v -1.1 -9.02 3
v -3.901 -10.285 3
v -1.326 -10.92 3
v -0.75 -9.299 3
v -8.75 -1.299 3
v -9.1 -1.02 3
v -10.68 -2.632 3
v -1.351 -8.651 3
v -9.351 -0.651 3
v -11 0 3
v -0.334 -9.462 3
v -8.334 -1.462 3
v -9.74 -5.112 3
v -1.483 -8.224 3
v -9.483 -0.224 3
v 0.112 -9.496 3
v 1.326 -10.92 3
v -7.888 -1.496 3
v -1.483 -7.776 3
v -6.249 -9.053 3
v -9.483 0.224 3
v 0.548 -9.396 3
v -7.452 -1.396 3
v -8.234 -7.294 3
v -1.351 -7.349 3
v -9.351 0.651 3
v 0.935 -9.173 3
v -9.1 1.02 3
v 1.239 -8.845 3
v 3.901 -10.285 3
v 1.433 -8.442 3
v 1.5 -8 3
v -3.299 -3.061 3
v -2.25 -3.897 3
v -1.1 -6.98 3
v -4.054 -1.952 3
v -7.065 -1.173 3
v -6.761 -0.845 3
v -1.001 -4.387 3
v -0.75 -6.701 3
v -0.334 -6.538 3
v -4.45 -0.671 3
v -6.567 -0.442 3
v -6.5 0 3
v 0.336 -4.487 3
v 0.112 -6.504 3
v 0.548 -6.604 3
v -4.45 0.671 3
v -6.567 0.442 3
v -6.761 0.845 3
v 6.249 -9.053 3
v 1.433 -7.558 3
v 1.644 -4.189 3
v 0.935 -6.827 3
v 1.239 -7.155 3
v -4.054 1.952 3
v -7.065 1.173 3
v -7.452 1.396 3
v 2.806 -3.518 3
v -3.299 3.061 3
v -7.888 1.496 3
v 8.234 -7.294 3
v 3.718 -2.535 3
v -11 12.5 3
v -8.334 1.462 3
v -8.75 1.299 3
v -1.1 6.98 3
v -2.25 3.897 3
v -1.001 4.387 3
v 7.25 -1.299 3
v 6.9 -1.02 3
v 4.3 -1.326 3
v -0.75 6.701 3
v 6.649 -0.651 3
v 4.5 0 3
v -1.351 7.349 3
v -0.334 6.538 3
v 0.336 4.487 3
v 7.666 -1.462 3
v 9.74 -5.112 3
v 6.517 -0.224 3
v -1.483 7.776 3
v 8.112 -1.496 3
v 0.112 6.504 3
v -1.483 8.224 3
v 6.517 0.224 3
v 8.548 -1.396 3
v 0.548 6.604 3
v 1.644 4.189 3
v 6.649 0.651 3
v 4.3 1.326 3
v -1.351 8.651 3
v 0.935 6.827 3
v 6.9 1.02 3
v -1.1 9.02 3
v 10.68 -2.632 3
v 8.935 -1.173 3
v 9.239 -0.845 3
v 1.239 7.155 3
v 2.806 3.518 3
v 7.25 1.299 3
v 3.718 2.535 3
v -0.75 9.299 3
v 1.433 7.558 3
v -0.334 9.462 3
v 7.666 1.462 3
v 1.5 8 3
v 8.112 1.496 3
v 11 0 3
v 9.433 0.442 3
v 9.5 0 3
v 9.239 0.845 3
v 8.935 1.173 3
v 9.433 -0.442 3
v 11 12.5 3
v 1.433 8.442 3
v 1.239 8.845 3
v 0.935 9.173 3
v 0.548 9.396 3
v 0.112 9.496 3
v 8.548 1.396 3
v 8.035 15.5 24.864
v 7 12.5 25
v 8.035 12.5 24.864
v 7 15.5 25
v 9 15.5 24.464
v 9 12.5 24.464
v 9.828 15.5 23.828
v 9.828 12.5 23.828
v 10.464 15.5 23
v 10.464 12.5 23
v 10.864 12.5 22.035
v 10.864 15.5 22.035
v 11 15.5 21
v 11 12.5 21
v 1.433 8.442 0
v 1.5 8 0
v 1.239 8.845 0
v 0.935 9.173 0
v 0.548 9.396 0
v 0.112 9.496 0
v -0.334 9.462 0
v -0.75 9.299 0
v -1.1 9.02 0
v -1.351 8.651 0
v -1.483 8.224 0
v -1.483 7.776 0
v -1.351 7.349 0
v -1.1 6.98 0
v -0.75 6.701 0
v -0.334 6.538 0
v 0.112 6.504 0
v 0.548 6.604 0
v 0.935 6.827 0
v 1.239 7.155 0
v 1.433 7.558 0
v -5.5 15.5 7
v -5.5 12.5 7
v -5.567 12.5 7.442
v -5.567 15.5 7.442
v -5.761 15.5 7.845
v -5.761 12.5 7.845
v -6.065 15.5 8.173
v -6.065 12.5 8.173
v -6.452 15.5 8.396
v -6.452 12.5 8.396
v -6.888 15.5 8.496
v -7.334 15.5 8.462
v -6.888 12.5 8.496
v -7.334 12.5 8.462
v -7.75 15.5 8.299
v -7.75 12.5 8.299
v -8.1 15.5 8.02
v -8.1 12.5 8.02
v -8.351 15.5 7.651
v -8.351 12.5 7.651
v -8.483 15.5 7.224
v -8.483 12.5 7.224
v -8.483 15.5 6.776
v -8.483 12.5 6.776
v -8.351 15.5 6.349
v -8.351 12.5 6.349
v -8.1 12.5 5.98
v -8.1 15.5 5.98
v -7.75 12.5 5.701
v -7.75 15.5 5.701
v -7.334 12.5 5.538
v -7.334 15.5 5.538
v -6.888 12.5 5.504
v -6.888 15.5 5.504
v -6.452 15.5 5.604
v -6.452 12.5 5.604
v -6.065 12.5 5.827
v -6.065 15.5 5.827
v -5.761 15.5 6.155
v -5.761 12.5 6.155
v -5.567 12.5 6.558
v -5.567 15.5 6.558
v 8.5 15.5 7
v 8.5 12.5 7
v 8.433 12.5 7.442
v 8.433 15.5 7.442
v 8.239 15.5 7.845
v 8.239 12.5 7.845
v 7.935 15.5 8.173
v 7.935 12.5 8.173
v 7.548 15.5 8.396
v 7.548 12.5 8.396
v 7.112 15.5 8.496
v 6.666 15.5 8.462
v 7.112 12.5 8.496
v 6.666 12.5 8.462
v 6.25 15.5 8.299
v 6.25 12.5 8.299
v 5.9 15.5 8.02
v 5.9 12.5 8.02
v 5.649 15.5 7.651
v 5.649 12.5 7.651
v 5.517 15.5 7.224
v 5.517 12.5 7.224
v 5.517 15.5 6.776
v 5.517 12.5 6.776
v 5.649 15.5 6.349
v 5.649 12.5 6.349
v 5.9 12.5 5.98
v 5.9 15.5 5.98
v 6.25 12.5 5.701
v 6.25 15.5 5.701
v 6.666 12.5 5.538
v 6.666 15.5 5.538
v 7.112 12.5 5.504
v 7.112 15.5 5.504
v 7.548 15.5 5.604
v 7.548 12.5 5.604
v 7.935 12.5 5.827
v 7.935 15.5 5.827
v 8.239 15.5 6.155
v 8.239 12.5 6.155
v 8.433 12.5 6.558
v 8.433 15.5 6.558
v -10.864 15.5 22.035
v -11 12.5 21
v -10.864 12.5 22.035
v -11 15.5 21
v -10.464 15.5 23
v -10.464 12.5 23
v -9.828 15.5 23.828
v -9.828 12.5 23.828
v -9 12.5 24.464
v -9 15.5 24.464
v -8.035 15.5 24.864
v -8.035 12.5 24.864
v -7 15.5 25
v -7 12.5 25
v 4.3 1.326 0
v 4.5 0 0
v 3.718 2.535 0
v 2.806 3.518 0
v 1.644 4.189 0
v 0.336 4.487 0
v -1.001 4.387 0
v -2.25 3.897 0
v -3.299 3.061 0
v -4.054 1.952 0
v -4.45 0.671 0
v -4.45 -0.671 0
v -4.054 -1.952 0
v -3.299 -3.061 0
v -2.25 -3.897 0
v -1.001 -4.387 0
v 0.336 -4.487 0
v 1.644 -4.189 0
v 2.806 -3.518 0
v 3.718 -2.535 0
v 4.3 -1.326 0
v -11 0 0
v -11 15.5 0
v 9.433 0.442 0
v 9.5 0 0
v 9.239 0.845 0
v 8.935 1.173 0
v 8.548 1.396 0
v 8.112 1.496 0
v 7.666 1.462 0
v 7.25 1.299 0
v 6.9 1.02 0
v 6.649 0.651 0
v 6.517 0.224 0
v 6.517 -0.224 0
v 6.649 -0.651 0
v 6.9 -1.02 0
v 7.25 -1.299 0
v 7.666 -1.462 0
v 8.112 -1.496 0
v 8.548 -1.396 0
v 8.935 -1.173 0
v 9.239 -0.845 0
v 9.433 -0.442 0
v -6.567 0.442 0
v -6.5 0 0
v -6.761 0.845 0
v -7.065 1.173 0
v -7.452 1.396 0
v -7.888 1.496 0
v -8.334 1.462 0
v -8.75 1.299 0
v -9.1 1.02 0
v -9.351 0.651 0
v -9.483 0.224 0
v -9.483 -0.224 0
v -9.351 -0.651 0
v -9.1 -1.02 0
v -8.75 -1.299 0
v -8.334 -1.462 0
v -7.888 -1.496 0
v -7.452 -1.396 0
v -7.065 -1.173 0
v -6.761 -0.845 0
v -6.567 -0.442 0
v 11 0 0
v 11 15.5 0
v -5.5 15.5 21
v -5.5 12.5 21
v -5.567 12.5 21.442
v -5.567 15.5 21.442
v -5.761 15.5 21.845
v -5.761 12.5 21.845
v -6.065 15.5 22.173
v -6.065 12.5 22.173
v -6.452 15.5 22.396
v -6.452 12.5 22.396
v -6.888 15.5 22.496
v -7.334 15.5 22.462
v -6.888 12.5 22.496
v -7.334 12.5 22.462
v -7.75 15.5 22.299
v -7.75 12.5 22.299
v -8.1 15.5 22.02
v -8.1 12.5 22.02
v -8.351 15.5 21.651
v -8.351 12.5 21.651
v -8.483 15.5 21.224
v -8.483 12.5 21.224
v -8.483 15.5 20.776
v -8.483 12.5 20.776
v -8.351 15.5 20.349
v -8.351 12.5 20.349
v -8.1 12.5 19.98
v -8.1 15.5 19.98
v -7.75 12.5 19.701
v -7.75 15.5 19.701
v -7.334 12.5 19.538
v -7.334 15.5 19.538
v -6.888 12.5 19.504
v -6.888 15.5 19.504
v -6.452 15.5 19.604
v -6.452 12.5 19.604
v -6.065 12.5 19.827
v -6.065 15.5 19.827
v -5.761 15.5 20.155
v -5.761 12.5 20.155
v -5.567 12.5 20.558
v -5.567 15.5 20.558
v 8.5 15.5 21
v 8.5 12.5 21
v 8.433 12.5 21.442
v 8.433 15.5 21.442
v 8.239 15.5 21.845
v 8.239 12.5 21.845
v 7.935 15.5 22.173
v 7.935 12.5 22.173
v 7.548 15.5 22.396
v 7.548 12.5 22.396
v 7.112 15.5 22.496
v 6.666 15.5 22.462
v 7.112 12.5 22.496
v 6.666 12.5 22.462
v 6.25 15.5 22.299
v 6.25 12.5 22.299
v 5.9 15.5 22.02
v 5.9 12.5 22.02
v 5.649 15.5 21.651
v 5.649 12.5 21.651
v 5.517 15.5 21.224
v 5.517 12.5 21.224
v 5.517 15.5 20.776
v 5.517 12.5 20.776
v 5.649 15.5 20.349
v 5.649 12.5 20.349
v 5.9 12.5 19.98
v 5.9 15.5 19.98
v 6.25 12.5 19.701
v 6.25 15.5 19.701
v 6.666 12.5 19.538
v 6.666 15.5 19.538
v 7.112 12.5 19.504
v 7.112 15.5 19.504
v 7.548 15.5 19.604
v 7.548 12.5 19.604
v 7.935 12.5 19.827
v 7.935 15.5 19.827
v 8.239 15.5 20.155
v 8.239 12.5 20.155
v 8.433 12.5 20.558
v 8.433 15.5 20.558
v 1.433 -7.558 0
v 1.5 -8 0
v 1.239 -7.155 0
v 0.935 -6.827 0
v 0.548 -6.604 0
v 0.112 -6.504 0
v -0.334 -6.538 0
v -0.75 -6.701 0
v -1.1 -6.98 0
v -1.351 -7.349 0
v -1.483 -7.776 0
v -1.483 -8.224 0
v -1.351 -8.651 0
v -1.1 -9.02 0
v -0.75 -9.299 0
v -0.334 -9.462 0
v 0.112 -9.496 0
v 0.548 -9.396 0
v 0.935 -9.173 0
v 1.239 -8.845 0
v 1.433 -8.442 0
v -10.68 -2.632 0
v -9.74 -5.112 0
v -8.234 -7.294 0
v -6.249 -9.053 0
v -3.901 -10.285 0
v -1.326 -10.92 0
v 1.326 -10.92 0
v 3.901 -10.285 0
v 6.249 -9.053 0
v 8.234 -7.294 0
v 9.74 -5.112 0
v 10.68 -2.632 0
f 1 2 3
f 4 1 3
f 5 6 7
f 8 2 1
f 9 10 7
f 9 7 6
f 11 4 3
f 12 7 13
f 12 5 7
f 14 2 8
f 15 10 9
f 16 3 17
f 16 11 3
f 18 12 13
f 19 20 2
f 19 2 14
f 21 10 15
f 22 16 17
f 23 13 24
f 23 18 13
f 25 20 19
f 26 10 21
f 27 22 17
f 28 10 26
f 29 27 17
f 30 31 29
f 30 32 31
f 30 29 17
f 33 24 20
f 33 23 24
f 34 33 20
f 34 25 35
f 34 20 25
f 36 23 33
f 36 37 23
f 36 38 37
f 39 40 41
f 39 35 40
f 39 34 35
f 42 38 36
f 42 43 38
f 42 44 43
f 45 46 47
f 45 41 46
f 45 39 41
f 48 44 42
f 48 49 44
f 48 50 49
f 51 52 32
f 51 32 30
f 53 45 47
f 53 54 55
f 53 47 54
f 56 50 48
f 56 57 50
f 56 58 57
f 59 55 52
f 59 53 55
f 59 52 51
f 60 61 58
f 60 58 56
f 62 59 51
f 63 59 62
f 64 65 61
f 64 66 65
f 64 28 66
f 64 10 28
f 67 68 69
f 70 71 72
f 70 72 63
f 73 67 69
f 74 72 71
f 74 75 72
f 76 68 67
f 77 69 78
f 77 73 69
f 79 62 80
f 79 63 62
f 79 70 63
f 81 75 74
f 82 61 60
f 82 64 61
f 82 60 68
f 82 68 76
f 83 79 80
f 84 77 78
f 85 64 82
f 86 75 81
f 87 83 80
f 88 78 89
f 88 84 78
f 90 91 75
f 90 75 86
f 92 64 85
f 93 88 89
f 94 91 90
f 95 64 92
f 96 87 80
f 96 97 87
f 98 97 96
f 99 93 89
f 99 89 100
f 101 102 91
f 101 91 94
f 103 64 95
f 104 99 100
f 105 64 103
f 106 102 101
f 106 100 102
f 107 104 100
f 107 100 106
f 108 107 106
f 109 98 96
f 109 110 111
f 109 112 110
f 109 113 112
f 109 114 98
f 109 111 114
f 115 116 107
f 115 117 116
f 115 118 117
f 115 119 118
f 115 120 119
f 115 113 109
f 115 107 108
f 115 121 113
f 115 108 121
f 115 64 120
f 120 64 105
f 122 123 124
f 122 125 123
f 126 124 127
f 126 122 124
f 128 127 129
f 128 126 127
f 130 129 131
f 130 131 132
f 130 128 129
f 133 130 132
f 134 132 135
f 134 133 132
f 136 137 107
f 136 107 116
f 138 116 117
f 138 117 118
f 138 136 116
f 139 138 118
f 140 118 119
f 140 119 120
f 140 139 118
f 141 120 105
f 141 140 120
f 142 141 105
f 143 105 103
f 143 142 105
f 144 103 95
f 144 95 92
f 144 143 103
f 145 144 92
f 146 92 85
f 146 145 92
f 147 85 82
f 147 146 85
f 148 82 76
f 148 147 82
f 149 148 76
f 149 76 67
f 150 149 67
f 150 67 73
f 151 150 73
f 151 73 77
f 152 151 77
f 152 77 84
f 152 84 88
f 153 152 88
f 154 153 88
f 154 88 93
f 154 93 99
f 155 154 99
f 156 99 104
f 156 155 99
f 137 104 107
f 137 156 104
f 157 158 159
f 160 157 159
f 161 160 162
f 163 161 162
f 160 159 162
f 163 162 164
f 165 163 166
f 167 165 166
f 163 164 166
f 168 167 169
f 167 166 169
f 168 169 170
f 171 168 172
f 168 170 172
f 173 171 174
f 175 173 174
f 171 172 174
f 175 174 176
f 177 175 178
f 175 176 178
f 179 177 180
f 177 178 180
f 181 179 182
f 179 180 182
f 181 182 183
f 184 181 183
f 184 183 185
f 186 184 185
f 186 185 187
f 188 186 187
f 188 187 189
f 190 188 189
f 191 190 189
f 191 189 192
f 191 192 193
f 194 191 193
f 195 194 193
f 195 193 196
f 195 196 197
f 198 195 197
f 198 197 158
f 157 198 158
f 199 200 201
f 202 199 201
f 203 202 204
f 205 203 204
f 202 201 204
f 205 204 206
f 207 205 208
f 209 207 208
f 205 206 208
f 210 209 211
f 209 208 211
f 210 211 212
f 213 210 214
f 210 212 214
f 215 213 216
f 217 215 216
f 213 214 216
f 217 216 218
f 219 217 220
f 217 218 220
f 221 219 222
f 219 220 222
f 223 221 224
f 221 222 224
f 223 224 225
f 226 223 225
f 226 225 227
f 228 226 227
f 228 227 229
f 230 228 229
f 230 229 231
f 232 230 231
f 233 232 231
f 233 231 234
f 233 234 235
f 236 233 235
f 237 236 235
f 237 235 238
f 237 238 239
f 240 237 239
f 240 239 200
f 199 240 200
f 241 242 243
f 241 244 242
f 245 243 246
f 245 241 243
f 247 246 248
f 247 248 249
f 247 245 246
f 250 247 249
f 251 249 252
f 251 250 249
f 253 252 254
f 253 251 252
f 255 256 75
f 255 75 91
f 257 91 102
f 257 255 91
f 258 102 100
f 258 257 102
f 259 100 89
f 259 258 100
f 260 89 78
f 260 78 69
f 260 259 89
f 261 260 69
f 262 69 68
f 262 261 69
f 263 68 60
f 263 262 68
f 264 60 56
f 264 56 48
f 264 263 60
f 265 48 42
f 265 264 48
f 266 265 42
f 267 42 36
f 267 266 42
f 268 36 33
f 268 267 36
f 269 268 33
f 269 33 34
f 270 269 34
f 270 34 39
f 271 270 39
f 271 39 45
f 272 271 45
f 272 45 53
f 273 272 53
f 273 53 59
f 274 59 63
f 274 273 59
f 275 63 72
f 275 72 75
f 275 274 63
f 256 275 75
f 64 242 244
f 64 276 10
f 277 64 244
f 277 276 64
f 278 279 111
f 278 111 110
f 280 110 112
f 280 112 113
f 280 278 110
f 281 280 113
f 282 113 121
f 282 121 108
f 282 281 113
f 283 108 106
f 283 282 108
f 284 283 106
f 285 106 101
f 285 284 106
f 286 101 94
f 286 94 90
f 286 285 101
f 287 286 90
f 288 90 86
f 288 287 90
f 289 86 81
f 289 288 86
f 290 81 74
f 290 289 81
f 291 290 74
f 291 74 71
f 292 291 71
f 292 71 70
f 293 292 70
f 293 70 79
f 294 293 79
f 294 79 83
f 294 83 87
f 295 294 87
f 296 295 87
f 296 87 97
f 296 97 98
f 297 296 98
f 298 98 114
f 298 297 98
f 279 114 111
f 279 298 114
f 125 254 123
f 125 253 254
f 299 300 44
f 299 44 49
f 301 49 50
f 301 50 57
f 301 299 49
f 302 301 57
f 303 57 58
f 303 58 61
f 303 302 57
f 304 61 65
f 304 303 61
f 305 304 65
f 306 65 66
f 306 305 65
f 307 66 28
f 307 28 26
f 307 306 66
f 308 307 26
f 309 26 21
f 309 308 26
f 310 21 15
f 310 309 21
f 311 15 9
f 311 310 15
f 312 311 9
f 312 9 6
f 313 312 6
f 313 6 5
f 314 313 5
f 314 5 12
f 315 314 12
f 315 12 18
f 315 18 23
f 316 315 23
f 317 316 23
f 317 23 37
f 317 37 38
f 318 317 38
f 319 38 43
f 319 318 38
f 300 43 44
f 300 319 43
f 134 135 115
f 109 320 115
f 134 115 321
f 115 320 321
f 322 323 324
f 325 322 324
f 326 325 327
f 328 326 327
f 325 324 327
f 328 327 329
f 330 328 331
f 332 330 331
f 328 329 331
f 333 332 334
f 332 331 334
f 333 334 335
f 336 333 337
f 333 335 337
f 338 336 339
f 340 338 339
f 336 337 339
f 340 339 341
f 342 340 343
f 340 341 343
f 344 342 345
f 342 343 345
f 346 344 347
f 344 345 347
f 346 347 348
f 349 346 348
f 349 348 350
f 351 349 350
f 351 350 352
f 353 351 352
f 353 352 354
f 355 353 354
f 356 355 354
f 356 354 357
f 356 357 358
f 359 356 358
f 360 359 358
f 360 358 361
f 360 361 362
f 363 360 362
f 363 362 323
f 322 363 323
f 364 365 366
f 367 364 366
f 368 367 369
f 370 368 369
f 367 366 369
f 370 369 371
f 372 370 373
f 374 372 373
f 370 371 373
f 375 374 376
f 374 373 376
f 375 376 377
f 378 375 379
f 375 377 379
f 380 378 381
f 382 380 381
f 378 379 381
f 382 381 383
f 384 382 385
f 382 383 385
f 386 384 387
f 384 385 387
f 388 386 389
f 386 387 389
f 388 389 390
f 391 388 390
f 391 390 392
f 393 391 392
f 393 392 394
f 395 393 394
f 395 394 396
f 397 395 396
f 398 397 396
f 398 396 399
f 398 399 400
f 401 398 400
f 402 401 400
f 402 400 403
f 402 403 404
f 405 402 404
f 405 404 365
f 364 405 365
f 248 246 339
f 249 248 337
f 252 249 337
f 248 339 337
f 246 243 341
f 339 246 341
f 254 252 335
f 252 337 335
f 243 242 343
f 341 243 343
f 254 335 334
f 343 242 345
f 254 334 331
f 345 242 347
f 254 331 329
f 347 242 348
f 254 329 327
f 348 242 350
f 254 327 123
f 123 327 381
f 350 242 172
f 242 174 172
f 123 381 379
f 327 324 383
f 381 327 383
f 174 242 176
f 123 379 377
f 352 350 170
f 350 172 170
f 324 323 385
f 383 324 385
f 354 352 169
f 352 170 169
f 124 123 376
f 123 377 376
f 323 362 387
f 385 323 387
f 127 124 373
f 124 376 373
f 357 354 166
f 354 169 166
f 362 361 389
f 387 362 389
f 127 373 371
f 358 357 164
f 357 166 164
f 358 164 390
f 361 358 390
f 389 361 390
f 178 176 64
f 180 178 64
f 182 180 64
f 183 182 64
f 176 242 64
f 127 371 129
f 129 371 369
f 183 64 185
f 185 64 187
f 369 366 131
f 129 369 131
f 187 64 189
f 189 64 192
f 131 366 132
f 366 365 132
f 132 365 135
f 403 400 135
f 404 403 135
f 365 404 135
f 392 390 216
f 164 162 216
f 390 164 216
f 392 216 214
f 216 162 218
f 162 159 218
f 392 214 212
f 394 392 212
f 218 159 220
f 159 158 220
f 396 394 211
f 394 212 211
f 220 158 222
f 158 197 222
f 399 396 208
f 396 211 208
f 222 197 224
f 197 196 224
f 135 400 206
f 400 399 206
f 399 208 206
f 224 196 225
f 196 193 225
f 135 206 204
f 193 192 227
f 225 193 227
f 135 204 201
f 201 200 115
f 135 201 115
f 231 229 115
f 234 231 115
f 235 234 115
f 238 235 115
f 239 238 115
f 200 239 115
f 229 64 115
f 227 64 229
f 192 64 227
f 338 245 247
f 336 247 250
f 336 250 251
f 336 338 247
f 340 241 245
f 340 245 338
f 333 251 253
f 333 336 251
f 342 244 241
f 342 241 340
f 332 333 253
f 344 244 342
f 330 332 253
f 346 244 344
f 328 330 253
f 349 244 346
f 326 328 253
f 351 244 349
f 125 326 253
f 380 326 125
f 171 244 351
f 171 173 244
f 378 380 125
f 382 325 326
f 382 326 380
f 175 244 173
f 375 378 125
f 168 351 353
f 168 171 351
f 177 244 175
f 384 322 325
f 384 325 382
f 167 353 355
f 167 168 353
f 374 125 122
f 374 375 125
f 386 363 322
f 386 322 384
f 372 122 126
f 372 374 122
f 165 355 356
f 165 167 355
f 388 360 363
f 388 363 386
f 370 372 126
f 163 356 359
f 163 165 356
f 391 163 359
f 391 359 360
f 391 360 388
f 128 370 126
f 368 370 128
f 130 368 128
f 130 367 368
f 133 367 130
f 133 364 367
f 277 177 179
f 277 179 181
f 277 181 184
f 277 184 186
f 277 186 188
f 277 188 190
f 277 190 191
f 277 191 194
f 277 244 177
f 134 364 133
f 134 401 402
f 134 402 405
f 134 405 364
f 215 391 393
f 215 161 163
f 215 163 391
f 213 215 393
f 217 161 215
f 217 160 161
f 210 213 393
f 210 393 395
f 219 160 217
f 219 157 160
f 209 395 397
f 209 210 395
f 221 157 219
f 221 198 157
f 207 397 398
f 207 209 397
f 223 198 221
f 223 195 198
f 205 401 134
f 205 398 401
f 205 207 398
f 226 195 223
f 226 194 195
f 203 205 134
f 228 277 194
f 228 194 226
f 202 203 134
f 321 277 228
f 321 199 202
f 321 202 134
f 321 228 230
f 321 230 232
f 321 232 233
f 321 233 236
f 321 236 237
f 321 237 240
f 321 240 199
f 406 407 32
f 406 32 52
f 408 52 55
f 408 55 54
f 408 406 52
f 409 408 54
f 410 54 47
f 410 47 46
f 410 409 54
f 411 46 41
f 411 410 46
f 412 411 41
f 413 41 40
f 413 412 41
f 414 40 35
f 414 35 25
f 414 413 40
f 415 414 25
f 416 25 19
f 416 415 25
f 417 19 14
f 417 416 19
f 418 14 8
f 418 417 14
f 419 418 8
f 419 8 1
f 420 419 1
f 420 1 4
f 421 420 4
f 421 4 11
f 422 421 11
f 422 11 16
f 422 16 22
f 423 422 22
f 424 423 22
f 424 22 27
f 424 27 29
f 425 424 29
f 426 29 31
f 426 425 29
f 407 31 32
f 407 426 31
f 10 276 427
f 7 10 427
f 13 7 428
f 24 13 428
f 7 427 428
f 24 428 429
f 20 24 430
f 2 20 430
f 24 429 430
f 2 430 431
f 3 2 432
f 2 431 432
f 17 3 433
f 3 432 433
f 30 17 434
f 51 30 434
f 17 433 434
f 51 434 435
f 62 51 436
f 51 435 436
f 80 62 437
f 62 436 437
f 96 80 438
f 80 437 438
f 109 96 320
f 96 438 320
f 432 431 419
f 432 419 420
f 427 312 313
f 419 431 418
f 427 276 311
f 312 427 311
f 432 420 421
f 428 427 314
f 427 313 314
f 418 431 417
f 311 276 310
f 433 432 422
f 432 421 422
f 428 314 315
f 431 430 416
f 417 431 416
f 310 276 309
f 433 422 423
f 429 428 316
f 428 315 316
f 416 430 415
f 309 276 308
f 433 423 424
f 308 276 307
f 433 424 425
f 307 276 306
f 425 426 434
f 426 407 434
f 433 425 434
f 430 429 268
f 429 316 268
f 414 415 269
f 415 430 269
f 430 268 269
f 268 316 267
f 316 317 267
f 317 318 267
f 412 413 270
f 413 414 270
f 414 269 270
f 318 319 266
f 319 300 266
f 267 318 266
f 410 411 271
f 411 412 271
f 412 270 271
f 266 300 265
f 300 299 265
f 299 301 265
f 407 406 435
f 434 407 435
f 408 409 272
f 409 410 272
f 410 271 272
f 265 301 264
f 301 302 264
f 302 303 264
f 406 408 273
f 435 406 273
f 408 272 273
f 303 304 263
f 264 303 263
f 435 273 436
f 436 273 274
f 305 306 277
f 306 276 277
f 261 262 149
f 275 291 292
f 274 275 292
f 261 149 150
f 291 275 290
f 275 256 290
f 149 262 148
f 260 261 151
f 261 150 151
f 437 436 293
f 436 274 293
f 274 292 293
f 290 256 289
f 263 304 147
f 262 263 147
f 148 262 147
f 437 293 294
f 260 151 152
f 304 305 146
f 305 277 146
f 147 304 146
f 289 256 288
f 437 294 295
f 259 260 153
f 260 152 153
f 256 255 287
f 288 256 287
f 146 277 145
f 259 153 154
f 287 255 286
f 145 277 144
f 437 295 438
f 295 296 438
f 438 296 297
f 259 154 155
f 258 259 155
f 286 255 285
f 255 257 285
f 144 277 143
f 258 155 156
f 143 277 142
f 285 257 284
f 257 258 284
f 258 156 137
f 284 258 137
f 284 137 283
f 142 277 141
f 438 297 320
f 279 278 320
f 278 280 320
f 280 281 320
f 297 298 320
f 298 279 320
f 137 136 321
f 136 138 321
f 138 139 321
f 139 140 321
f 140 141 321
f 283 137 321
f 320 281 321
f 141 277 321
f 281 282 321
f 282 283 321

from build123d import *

# Parameters (mm, degrees)
ESQUISSE1_R             = 1.5
ESQUISSE1_R_2           = 4.5
BOSS_EXTRU_1_DEPTH      = 3
ESQUISSE2_W             = 22
ESQUISSE2_H             = 3
BOSS_EXTRU_2_DEPTH      = 22
ENL_V_MAT_EXTRU_1_REACH = 38.031
ESQUISSE3_R             = 1.5
CONG_1_R                = 4


with BuildPart() as part:
    # Esquisse1 → Boss.-Extru.1 (new body)
    with BuildSketch(Plane.XY):
        with BuildLine():
            Line((11, 0), (11, 15.5))
            Line((11, 15.5), (-11, 15.5))
            Line((-11, 15.5), (-11, 0))
            ThreePointArc((-11, 0), (0, -11), (11, 0))
        make_face()
        with Locations((8, 0)):
            Circle(ESQUISSE1_R, mode=Mode.SUBTRACT)
        with Locations((0, -8)):
            Circle(ESQUISSE1_R, mode=Mode.SUBTRACT)
        with Locations((0, 8)):
            Circle(ESQUISSE1_R, mode=Mode.SUBTRACT)
        with Locations((-8, 0)):
            Circle(ESQUISSE1_R, mode=Mode.SUBTRACT)
        Circle(ESQUISSE1_R_2, mode=Mode.SUBTRACT)
    extrude(amount=BOSS_EXTRU_1_DEPTH)

    # Esquisse2 → Boss.-Extru.2 (add)
    with BuildSketch(Plane.XY.offset(3)):
        with Locations((0, 14)):
            Rectangle(ESQUISSE2_W, ESQUISSE2_H)
    extrude(amount=BOSS_EXTRU_2_DEPTH)

    # Esquisse3 → Enlèv. mat.-Extru.1 (cut, up to next)
    with BuildSketch(Plane.XZ.offset(-12.5), mode=Mode.PRIVATE) as enl_v_mat_extru_1_sk1:
        with Locations((7, 21)):
            Circle(ESQUISSE3_R)
    enl_v_mat_extru_1_tool1 = extrude(enl_v_mat_extru_1_sk1.sketch, amount=-ENL_V_MAT_EXTRU_1_REACH, mode=Mode.PRIVATE) & part.part
    # Esquisse3 → Enlèv. mat.-Extru.1 (cut, up to next)
    with BuildSketch(Plane.XZ.offset(-12.5), mode=Mode.PRIVATE) as enl_v_mat_extru_1_sk2:
        with Locations((-7, 21)):
            Circle(ESQUISSE3_R)
    enl_v_mat_extru_1_tool2 = extrude(enl_v_mat_extru_1_sk2.sketch, amount=-ENL_V_MAT_EXTRU_1_REACH, mode=Mode.PRIVATE) & part.part
    # Esquisse3 → Enlèv. mat.-Extru.1 (cut, up to next)
    with BuildSketch(Plane.XZ.offset(-12.5), mode=Mode.PRIVATE) as enl_v_mat_extru_1_sk3:
        with Locations((7, 7)):
            Circle(ESQUISSE3_R)
    enl_v_mat_extru_1_tool3 = extrude(enl_v_mat_extru_1_sk3.sketch, amount=-ENL_V_MAT_EXTRU_1_REACH, mode=Mode.PRIVATE) & part.part
    # Esquisse3 → Enlèv. mat.-Extru.1 (cut, up to next)
    with BuildSketch(Plane.XZ.offset(-12.5), mode=Mode.PRIVATE) as enl_v_mat_extru_1_sk4:
        with Locations((-7, 7)):
            Circle(ESQUISSE3_R)
    enl_v_mat_extru_1_tool4 = extrude(enl_v_mat_extru_1_sk4.sketch, amount=-ENL_V_MAT_EXTRU_1_REACH, mode=Mode.PRIVATE) & part.part
    add(enl_v_mat_extru_1_tool1.solids().sort_by_distance((7, 12.5, 21))[0], mode=Mode.SUBTRACT)
    add(enl_v_mat_extru_1_tool2.solids().sort_by_distance((-7, 12.5, 21))[0], mode=Mode.SUBTRACT)
    add(enl_v_mat_extru_1_tool3.solids().sort_by_distance((7, 12.5, 7))[0], mode=Mode.SUBTRACT)
    add(enl_v_mat_extru_1_tool4.solids().sort_by_distance((-7, 12.5, 7))[0], mode=Mode.SUBTRACT)

    # Congé1
    cong_1_edges = [part.edges().sort_by_distance(p)[0] for p in [
        (11, 14, 25),
        (-11, 14, 25),
    ]]
    fillet(cong_1_edges, radius=CONG_1_R)


solid = part.part
